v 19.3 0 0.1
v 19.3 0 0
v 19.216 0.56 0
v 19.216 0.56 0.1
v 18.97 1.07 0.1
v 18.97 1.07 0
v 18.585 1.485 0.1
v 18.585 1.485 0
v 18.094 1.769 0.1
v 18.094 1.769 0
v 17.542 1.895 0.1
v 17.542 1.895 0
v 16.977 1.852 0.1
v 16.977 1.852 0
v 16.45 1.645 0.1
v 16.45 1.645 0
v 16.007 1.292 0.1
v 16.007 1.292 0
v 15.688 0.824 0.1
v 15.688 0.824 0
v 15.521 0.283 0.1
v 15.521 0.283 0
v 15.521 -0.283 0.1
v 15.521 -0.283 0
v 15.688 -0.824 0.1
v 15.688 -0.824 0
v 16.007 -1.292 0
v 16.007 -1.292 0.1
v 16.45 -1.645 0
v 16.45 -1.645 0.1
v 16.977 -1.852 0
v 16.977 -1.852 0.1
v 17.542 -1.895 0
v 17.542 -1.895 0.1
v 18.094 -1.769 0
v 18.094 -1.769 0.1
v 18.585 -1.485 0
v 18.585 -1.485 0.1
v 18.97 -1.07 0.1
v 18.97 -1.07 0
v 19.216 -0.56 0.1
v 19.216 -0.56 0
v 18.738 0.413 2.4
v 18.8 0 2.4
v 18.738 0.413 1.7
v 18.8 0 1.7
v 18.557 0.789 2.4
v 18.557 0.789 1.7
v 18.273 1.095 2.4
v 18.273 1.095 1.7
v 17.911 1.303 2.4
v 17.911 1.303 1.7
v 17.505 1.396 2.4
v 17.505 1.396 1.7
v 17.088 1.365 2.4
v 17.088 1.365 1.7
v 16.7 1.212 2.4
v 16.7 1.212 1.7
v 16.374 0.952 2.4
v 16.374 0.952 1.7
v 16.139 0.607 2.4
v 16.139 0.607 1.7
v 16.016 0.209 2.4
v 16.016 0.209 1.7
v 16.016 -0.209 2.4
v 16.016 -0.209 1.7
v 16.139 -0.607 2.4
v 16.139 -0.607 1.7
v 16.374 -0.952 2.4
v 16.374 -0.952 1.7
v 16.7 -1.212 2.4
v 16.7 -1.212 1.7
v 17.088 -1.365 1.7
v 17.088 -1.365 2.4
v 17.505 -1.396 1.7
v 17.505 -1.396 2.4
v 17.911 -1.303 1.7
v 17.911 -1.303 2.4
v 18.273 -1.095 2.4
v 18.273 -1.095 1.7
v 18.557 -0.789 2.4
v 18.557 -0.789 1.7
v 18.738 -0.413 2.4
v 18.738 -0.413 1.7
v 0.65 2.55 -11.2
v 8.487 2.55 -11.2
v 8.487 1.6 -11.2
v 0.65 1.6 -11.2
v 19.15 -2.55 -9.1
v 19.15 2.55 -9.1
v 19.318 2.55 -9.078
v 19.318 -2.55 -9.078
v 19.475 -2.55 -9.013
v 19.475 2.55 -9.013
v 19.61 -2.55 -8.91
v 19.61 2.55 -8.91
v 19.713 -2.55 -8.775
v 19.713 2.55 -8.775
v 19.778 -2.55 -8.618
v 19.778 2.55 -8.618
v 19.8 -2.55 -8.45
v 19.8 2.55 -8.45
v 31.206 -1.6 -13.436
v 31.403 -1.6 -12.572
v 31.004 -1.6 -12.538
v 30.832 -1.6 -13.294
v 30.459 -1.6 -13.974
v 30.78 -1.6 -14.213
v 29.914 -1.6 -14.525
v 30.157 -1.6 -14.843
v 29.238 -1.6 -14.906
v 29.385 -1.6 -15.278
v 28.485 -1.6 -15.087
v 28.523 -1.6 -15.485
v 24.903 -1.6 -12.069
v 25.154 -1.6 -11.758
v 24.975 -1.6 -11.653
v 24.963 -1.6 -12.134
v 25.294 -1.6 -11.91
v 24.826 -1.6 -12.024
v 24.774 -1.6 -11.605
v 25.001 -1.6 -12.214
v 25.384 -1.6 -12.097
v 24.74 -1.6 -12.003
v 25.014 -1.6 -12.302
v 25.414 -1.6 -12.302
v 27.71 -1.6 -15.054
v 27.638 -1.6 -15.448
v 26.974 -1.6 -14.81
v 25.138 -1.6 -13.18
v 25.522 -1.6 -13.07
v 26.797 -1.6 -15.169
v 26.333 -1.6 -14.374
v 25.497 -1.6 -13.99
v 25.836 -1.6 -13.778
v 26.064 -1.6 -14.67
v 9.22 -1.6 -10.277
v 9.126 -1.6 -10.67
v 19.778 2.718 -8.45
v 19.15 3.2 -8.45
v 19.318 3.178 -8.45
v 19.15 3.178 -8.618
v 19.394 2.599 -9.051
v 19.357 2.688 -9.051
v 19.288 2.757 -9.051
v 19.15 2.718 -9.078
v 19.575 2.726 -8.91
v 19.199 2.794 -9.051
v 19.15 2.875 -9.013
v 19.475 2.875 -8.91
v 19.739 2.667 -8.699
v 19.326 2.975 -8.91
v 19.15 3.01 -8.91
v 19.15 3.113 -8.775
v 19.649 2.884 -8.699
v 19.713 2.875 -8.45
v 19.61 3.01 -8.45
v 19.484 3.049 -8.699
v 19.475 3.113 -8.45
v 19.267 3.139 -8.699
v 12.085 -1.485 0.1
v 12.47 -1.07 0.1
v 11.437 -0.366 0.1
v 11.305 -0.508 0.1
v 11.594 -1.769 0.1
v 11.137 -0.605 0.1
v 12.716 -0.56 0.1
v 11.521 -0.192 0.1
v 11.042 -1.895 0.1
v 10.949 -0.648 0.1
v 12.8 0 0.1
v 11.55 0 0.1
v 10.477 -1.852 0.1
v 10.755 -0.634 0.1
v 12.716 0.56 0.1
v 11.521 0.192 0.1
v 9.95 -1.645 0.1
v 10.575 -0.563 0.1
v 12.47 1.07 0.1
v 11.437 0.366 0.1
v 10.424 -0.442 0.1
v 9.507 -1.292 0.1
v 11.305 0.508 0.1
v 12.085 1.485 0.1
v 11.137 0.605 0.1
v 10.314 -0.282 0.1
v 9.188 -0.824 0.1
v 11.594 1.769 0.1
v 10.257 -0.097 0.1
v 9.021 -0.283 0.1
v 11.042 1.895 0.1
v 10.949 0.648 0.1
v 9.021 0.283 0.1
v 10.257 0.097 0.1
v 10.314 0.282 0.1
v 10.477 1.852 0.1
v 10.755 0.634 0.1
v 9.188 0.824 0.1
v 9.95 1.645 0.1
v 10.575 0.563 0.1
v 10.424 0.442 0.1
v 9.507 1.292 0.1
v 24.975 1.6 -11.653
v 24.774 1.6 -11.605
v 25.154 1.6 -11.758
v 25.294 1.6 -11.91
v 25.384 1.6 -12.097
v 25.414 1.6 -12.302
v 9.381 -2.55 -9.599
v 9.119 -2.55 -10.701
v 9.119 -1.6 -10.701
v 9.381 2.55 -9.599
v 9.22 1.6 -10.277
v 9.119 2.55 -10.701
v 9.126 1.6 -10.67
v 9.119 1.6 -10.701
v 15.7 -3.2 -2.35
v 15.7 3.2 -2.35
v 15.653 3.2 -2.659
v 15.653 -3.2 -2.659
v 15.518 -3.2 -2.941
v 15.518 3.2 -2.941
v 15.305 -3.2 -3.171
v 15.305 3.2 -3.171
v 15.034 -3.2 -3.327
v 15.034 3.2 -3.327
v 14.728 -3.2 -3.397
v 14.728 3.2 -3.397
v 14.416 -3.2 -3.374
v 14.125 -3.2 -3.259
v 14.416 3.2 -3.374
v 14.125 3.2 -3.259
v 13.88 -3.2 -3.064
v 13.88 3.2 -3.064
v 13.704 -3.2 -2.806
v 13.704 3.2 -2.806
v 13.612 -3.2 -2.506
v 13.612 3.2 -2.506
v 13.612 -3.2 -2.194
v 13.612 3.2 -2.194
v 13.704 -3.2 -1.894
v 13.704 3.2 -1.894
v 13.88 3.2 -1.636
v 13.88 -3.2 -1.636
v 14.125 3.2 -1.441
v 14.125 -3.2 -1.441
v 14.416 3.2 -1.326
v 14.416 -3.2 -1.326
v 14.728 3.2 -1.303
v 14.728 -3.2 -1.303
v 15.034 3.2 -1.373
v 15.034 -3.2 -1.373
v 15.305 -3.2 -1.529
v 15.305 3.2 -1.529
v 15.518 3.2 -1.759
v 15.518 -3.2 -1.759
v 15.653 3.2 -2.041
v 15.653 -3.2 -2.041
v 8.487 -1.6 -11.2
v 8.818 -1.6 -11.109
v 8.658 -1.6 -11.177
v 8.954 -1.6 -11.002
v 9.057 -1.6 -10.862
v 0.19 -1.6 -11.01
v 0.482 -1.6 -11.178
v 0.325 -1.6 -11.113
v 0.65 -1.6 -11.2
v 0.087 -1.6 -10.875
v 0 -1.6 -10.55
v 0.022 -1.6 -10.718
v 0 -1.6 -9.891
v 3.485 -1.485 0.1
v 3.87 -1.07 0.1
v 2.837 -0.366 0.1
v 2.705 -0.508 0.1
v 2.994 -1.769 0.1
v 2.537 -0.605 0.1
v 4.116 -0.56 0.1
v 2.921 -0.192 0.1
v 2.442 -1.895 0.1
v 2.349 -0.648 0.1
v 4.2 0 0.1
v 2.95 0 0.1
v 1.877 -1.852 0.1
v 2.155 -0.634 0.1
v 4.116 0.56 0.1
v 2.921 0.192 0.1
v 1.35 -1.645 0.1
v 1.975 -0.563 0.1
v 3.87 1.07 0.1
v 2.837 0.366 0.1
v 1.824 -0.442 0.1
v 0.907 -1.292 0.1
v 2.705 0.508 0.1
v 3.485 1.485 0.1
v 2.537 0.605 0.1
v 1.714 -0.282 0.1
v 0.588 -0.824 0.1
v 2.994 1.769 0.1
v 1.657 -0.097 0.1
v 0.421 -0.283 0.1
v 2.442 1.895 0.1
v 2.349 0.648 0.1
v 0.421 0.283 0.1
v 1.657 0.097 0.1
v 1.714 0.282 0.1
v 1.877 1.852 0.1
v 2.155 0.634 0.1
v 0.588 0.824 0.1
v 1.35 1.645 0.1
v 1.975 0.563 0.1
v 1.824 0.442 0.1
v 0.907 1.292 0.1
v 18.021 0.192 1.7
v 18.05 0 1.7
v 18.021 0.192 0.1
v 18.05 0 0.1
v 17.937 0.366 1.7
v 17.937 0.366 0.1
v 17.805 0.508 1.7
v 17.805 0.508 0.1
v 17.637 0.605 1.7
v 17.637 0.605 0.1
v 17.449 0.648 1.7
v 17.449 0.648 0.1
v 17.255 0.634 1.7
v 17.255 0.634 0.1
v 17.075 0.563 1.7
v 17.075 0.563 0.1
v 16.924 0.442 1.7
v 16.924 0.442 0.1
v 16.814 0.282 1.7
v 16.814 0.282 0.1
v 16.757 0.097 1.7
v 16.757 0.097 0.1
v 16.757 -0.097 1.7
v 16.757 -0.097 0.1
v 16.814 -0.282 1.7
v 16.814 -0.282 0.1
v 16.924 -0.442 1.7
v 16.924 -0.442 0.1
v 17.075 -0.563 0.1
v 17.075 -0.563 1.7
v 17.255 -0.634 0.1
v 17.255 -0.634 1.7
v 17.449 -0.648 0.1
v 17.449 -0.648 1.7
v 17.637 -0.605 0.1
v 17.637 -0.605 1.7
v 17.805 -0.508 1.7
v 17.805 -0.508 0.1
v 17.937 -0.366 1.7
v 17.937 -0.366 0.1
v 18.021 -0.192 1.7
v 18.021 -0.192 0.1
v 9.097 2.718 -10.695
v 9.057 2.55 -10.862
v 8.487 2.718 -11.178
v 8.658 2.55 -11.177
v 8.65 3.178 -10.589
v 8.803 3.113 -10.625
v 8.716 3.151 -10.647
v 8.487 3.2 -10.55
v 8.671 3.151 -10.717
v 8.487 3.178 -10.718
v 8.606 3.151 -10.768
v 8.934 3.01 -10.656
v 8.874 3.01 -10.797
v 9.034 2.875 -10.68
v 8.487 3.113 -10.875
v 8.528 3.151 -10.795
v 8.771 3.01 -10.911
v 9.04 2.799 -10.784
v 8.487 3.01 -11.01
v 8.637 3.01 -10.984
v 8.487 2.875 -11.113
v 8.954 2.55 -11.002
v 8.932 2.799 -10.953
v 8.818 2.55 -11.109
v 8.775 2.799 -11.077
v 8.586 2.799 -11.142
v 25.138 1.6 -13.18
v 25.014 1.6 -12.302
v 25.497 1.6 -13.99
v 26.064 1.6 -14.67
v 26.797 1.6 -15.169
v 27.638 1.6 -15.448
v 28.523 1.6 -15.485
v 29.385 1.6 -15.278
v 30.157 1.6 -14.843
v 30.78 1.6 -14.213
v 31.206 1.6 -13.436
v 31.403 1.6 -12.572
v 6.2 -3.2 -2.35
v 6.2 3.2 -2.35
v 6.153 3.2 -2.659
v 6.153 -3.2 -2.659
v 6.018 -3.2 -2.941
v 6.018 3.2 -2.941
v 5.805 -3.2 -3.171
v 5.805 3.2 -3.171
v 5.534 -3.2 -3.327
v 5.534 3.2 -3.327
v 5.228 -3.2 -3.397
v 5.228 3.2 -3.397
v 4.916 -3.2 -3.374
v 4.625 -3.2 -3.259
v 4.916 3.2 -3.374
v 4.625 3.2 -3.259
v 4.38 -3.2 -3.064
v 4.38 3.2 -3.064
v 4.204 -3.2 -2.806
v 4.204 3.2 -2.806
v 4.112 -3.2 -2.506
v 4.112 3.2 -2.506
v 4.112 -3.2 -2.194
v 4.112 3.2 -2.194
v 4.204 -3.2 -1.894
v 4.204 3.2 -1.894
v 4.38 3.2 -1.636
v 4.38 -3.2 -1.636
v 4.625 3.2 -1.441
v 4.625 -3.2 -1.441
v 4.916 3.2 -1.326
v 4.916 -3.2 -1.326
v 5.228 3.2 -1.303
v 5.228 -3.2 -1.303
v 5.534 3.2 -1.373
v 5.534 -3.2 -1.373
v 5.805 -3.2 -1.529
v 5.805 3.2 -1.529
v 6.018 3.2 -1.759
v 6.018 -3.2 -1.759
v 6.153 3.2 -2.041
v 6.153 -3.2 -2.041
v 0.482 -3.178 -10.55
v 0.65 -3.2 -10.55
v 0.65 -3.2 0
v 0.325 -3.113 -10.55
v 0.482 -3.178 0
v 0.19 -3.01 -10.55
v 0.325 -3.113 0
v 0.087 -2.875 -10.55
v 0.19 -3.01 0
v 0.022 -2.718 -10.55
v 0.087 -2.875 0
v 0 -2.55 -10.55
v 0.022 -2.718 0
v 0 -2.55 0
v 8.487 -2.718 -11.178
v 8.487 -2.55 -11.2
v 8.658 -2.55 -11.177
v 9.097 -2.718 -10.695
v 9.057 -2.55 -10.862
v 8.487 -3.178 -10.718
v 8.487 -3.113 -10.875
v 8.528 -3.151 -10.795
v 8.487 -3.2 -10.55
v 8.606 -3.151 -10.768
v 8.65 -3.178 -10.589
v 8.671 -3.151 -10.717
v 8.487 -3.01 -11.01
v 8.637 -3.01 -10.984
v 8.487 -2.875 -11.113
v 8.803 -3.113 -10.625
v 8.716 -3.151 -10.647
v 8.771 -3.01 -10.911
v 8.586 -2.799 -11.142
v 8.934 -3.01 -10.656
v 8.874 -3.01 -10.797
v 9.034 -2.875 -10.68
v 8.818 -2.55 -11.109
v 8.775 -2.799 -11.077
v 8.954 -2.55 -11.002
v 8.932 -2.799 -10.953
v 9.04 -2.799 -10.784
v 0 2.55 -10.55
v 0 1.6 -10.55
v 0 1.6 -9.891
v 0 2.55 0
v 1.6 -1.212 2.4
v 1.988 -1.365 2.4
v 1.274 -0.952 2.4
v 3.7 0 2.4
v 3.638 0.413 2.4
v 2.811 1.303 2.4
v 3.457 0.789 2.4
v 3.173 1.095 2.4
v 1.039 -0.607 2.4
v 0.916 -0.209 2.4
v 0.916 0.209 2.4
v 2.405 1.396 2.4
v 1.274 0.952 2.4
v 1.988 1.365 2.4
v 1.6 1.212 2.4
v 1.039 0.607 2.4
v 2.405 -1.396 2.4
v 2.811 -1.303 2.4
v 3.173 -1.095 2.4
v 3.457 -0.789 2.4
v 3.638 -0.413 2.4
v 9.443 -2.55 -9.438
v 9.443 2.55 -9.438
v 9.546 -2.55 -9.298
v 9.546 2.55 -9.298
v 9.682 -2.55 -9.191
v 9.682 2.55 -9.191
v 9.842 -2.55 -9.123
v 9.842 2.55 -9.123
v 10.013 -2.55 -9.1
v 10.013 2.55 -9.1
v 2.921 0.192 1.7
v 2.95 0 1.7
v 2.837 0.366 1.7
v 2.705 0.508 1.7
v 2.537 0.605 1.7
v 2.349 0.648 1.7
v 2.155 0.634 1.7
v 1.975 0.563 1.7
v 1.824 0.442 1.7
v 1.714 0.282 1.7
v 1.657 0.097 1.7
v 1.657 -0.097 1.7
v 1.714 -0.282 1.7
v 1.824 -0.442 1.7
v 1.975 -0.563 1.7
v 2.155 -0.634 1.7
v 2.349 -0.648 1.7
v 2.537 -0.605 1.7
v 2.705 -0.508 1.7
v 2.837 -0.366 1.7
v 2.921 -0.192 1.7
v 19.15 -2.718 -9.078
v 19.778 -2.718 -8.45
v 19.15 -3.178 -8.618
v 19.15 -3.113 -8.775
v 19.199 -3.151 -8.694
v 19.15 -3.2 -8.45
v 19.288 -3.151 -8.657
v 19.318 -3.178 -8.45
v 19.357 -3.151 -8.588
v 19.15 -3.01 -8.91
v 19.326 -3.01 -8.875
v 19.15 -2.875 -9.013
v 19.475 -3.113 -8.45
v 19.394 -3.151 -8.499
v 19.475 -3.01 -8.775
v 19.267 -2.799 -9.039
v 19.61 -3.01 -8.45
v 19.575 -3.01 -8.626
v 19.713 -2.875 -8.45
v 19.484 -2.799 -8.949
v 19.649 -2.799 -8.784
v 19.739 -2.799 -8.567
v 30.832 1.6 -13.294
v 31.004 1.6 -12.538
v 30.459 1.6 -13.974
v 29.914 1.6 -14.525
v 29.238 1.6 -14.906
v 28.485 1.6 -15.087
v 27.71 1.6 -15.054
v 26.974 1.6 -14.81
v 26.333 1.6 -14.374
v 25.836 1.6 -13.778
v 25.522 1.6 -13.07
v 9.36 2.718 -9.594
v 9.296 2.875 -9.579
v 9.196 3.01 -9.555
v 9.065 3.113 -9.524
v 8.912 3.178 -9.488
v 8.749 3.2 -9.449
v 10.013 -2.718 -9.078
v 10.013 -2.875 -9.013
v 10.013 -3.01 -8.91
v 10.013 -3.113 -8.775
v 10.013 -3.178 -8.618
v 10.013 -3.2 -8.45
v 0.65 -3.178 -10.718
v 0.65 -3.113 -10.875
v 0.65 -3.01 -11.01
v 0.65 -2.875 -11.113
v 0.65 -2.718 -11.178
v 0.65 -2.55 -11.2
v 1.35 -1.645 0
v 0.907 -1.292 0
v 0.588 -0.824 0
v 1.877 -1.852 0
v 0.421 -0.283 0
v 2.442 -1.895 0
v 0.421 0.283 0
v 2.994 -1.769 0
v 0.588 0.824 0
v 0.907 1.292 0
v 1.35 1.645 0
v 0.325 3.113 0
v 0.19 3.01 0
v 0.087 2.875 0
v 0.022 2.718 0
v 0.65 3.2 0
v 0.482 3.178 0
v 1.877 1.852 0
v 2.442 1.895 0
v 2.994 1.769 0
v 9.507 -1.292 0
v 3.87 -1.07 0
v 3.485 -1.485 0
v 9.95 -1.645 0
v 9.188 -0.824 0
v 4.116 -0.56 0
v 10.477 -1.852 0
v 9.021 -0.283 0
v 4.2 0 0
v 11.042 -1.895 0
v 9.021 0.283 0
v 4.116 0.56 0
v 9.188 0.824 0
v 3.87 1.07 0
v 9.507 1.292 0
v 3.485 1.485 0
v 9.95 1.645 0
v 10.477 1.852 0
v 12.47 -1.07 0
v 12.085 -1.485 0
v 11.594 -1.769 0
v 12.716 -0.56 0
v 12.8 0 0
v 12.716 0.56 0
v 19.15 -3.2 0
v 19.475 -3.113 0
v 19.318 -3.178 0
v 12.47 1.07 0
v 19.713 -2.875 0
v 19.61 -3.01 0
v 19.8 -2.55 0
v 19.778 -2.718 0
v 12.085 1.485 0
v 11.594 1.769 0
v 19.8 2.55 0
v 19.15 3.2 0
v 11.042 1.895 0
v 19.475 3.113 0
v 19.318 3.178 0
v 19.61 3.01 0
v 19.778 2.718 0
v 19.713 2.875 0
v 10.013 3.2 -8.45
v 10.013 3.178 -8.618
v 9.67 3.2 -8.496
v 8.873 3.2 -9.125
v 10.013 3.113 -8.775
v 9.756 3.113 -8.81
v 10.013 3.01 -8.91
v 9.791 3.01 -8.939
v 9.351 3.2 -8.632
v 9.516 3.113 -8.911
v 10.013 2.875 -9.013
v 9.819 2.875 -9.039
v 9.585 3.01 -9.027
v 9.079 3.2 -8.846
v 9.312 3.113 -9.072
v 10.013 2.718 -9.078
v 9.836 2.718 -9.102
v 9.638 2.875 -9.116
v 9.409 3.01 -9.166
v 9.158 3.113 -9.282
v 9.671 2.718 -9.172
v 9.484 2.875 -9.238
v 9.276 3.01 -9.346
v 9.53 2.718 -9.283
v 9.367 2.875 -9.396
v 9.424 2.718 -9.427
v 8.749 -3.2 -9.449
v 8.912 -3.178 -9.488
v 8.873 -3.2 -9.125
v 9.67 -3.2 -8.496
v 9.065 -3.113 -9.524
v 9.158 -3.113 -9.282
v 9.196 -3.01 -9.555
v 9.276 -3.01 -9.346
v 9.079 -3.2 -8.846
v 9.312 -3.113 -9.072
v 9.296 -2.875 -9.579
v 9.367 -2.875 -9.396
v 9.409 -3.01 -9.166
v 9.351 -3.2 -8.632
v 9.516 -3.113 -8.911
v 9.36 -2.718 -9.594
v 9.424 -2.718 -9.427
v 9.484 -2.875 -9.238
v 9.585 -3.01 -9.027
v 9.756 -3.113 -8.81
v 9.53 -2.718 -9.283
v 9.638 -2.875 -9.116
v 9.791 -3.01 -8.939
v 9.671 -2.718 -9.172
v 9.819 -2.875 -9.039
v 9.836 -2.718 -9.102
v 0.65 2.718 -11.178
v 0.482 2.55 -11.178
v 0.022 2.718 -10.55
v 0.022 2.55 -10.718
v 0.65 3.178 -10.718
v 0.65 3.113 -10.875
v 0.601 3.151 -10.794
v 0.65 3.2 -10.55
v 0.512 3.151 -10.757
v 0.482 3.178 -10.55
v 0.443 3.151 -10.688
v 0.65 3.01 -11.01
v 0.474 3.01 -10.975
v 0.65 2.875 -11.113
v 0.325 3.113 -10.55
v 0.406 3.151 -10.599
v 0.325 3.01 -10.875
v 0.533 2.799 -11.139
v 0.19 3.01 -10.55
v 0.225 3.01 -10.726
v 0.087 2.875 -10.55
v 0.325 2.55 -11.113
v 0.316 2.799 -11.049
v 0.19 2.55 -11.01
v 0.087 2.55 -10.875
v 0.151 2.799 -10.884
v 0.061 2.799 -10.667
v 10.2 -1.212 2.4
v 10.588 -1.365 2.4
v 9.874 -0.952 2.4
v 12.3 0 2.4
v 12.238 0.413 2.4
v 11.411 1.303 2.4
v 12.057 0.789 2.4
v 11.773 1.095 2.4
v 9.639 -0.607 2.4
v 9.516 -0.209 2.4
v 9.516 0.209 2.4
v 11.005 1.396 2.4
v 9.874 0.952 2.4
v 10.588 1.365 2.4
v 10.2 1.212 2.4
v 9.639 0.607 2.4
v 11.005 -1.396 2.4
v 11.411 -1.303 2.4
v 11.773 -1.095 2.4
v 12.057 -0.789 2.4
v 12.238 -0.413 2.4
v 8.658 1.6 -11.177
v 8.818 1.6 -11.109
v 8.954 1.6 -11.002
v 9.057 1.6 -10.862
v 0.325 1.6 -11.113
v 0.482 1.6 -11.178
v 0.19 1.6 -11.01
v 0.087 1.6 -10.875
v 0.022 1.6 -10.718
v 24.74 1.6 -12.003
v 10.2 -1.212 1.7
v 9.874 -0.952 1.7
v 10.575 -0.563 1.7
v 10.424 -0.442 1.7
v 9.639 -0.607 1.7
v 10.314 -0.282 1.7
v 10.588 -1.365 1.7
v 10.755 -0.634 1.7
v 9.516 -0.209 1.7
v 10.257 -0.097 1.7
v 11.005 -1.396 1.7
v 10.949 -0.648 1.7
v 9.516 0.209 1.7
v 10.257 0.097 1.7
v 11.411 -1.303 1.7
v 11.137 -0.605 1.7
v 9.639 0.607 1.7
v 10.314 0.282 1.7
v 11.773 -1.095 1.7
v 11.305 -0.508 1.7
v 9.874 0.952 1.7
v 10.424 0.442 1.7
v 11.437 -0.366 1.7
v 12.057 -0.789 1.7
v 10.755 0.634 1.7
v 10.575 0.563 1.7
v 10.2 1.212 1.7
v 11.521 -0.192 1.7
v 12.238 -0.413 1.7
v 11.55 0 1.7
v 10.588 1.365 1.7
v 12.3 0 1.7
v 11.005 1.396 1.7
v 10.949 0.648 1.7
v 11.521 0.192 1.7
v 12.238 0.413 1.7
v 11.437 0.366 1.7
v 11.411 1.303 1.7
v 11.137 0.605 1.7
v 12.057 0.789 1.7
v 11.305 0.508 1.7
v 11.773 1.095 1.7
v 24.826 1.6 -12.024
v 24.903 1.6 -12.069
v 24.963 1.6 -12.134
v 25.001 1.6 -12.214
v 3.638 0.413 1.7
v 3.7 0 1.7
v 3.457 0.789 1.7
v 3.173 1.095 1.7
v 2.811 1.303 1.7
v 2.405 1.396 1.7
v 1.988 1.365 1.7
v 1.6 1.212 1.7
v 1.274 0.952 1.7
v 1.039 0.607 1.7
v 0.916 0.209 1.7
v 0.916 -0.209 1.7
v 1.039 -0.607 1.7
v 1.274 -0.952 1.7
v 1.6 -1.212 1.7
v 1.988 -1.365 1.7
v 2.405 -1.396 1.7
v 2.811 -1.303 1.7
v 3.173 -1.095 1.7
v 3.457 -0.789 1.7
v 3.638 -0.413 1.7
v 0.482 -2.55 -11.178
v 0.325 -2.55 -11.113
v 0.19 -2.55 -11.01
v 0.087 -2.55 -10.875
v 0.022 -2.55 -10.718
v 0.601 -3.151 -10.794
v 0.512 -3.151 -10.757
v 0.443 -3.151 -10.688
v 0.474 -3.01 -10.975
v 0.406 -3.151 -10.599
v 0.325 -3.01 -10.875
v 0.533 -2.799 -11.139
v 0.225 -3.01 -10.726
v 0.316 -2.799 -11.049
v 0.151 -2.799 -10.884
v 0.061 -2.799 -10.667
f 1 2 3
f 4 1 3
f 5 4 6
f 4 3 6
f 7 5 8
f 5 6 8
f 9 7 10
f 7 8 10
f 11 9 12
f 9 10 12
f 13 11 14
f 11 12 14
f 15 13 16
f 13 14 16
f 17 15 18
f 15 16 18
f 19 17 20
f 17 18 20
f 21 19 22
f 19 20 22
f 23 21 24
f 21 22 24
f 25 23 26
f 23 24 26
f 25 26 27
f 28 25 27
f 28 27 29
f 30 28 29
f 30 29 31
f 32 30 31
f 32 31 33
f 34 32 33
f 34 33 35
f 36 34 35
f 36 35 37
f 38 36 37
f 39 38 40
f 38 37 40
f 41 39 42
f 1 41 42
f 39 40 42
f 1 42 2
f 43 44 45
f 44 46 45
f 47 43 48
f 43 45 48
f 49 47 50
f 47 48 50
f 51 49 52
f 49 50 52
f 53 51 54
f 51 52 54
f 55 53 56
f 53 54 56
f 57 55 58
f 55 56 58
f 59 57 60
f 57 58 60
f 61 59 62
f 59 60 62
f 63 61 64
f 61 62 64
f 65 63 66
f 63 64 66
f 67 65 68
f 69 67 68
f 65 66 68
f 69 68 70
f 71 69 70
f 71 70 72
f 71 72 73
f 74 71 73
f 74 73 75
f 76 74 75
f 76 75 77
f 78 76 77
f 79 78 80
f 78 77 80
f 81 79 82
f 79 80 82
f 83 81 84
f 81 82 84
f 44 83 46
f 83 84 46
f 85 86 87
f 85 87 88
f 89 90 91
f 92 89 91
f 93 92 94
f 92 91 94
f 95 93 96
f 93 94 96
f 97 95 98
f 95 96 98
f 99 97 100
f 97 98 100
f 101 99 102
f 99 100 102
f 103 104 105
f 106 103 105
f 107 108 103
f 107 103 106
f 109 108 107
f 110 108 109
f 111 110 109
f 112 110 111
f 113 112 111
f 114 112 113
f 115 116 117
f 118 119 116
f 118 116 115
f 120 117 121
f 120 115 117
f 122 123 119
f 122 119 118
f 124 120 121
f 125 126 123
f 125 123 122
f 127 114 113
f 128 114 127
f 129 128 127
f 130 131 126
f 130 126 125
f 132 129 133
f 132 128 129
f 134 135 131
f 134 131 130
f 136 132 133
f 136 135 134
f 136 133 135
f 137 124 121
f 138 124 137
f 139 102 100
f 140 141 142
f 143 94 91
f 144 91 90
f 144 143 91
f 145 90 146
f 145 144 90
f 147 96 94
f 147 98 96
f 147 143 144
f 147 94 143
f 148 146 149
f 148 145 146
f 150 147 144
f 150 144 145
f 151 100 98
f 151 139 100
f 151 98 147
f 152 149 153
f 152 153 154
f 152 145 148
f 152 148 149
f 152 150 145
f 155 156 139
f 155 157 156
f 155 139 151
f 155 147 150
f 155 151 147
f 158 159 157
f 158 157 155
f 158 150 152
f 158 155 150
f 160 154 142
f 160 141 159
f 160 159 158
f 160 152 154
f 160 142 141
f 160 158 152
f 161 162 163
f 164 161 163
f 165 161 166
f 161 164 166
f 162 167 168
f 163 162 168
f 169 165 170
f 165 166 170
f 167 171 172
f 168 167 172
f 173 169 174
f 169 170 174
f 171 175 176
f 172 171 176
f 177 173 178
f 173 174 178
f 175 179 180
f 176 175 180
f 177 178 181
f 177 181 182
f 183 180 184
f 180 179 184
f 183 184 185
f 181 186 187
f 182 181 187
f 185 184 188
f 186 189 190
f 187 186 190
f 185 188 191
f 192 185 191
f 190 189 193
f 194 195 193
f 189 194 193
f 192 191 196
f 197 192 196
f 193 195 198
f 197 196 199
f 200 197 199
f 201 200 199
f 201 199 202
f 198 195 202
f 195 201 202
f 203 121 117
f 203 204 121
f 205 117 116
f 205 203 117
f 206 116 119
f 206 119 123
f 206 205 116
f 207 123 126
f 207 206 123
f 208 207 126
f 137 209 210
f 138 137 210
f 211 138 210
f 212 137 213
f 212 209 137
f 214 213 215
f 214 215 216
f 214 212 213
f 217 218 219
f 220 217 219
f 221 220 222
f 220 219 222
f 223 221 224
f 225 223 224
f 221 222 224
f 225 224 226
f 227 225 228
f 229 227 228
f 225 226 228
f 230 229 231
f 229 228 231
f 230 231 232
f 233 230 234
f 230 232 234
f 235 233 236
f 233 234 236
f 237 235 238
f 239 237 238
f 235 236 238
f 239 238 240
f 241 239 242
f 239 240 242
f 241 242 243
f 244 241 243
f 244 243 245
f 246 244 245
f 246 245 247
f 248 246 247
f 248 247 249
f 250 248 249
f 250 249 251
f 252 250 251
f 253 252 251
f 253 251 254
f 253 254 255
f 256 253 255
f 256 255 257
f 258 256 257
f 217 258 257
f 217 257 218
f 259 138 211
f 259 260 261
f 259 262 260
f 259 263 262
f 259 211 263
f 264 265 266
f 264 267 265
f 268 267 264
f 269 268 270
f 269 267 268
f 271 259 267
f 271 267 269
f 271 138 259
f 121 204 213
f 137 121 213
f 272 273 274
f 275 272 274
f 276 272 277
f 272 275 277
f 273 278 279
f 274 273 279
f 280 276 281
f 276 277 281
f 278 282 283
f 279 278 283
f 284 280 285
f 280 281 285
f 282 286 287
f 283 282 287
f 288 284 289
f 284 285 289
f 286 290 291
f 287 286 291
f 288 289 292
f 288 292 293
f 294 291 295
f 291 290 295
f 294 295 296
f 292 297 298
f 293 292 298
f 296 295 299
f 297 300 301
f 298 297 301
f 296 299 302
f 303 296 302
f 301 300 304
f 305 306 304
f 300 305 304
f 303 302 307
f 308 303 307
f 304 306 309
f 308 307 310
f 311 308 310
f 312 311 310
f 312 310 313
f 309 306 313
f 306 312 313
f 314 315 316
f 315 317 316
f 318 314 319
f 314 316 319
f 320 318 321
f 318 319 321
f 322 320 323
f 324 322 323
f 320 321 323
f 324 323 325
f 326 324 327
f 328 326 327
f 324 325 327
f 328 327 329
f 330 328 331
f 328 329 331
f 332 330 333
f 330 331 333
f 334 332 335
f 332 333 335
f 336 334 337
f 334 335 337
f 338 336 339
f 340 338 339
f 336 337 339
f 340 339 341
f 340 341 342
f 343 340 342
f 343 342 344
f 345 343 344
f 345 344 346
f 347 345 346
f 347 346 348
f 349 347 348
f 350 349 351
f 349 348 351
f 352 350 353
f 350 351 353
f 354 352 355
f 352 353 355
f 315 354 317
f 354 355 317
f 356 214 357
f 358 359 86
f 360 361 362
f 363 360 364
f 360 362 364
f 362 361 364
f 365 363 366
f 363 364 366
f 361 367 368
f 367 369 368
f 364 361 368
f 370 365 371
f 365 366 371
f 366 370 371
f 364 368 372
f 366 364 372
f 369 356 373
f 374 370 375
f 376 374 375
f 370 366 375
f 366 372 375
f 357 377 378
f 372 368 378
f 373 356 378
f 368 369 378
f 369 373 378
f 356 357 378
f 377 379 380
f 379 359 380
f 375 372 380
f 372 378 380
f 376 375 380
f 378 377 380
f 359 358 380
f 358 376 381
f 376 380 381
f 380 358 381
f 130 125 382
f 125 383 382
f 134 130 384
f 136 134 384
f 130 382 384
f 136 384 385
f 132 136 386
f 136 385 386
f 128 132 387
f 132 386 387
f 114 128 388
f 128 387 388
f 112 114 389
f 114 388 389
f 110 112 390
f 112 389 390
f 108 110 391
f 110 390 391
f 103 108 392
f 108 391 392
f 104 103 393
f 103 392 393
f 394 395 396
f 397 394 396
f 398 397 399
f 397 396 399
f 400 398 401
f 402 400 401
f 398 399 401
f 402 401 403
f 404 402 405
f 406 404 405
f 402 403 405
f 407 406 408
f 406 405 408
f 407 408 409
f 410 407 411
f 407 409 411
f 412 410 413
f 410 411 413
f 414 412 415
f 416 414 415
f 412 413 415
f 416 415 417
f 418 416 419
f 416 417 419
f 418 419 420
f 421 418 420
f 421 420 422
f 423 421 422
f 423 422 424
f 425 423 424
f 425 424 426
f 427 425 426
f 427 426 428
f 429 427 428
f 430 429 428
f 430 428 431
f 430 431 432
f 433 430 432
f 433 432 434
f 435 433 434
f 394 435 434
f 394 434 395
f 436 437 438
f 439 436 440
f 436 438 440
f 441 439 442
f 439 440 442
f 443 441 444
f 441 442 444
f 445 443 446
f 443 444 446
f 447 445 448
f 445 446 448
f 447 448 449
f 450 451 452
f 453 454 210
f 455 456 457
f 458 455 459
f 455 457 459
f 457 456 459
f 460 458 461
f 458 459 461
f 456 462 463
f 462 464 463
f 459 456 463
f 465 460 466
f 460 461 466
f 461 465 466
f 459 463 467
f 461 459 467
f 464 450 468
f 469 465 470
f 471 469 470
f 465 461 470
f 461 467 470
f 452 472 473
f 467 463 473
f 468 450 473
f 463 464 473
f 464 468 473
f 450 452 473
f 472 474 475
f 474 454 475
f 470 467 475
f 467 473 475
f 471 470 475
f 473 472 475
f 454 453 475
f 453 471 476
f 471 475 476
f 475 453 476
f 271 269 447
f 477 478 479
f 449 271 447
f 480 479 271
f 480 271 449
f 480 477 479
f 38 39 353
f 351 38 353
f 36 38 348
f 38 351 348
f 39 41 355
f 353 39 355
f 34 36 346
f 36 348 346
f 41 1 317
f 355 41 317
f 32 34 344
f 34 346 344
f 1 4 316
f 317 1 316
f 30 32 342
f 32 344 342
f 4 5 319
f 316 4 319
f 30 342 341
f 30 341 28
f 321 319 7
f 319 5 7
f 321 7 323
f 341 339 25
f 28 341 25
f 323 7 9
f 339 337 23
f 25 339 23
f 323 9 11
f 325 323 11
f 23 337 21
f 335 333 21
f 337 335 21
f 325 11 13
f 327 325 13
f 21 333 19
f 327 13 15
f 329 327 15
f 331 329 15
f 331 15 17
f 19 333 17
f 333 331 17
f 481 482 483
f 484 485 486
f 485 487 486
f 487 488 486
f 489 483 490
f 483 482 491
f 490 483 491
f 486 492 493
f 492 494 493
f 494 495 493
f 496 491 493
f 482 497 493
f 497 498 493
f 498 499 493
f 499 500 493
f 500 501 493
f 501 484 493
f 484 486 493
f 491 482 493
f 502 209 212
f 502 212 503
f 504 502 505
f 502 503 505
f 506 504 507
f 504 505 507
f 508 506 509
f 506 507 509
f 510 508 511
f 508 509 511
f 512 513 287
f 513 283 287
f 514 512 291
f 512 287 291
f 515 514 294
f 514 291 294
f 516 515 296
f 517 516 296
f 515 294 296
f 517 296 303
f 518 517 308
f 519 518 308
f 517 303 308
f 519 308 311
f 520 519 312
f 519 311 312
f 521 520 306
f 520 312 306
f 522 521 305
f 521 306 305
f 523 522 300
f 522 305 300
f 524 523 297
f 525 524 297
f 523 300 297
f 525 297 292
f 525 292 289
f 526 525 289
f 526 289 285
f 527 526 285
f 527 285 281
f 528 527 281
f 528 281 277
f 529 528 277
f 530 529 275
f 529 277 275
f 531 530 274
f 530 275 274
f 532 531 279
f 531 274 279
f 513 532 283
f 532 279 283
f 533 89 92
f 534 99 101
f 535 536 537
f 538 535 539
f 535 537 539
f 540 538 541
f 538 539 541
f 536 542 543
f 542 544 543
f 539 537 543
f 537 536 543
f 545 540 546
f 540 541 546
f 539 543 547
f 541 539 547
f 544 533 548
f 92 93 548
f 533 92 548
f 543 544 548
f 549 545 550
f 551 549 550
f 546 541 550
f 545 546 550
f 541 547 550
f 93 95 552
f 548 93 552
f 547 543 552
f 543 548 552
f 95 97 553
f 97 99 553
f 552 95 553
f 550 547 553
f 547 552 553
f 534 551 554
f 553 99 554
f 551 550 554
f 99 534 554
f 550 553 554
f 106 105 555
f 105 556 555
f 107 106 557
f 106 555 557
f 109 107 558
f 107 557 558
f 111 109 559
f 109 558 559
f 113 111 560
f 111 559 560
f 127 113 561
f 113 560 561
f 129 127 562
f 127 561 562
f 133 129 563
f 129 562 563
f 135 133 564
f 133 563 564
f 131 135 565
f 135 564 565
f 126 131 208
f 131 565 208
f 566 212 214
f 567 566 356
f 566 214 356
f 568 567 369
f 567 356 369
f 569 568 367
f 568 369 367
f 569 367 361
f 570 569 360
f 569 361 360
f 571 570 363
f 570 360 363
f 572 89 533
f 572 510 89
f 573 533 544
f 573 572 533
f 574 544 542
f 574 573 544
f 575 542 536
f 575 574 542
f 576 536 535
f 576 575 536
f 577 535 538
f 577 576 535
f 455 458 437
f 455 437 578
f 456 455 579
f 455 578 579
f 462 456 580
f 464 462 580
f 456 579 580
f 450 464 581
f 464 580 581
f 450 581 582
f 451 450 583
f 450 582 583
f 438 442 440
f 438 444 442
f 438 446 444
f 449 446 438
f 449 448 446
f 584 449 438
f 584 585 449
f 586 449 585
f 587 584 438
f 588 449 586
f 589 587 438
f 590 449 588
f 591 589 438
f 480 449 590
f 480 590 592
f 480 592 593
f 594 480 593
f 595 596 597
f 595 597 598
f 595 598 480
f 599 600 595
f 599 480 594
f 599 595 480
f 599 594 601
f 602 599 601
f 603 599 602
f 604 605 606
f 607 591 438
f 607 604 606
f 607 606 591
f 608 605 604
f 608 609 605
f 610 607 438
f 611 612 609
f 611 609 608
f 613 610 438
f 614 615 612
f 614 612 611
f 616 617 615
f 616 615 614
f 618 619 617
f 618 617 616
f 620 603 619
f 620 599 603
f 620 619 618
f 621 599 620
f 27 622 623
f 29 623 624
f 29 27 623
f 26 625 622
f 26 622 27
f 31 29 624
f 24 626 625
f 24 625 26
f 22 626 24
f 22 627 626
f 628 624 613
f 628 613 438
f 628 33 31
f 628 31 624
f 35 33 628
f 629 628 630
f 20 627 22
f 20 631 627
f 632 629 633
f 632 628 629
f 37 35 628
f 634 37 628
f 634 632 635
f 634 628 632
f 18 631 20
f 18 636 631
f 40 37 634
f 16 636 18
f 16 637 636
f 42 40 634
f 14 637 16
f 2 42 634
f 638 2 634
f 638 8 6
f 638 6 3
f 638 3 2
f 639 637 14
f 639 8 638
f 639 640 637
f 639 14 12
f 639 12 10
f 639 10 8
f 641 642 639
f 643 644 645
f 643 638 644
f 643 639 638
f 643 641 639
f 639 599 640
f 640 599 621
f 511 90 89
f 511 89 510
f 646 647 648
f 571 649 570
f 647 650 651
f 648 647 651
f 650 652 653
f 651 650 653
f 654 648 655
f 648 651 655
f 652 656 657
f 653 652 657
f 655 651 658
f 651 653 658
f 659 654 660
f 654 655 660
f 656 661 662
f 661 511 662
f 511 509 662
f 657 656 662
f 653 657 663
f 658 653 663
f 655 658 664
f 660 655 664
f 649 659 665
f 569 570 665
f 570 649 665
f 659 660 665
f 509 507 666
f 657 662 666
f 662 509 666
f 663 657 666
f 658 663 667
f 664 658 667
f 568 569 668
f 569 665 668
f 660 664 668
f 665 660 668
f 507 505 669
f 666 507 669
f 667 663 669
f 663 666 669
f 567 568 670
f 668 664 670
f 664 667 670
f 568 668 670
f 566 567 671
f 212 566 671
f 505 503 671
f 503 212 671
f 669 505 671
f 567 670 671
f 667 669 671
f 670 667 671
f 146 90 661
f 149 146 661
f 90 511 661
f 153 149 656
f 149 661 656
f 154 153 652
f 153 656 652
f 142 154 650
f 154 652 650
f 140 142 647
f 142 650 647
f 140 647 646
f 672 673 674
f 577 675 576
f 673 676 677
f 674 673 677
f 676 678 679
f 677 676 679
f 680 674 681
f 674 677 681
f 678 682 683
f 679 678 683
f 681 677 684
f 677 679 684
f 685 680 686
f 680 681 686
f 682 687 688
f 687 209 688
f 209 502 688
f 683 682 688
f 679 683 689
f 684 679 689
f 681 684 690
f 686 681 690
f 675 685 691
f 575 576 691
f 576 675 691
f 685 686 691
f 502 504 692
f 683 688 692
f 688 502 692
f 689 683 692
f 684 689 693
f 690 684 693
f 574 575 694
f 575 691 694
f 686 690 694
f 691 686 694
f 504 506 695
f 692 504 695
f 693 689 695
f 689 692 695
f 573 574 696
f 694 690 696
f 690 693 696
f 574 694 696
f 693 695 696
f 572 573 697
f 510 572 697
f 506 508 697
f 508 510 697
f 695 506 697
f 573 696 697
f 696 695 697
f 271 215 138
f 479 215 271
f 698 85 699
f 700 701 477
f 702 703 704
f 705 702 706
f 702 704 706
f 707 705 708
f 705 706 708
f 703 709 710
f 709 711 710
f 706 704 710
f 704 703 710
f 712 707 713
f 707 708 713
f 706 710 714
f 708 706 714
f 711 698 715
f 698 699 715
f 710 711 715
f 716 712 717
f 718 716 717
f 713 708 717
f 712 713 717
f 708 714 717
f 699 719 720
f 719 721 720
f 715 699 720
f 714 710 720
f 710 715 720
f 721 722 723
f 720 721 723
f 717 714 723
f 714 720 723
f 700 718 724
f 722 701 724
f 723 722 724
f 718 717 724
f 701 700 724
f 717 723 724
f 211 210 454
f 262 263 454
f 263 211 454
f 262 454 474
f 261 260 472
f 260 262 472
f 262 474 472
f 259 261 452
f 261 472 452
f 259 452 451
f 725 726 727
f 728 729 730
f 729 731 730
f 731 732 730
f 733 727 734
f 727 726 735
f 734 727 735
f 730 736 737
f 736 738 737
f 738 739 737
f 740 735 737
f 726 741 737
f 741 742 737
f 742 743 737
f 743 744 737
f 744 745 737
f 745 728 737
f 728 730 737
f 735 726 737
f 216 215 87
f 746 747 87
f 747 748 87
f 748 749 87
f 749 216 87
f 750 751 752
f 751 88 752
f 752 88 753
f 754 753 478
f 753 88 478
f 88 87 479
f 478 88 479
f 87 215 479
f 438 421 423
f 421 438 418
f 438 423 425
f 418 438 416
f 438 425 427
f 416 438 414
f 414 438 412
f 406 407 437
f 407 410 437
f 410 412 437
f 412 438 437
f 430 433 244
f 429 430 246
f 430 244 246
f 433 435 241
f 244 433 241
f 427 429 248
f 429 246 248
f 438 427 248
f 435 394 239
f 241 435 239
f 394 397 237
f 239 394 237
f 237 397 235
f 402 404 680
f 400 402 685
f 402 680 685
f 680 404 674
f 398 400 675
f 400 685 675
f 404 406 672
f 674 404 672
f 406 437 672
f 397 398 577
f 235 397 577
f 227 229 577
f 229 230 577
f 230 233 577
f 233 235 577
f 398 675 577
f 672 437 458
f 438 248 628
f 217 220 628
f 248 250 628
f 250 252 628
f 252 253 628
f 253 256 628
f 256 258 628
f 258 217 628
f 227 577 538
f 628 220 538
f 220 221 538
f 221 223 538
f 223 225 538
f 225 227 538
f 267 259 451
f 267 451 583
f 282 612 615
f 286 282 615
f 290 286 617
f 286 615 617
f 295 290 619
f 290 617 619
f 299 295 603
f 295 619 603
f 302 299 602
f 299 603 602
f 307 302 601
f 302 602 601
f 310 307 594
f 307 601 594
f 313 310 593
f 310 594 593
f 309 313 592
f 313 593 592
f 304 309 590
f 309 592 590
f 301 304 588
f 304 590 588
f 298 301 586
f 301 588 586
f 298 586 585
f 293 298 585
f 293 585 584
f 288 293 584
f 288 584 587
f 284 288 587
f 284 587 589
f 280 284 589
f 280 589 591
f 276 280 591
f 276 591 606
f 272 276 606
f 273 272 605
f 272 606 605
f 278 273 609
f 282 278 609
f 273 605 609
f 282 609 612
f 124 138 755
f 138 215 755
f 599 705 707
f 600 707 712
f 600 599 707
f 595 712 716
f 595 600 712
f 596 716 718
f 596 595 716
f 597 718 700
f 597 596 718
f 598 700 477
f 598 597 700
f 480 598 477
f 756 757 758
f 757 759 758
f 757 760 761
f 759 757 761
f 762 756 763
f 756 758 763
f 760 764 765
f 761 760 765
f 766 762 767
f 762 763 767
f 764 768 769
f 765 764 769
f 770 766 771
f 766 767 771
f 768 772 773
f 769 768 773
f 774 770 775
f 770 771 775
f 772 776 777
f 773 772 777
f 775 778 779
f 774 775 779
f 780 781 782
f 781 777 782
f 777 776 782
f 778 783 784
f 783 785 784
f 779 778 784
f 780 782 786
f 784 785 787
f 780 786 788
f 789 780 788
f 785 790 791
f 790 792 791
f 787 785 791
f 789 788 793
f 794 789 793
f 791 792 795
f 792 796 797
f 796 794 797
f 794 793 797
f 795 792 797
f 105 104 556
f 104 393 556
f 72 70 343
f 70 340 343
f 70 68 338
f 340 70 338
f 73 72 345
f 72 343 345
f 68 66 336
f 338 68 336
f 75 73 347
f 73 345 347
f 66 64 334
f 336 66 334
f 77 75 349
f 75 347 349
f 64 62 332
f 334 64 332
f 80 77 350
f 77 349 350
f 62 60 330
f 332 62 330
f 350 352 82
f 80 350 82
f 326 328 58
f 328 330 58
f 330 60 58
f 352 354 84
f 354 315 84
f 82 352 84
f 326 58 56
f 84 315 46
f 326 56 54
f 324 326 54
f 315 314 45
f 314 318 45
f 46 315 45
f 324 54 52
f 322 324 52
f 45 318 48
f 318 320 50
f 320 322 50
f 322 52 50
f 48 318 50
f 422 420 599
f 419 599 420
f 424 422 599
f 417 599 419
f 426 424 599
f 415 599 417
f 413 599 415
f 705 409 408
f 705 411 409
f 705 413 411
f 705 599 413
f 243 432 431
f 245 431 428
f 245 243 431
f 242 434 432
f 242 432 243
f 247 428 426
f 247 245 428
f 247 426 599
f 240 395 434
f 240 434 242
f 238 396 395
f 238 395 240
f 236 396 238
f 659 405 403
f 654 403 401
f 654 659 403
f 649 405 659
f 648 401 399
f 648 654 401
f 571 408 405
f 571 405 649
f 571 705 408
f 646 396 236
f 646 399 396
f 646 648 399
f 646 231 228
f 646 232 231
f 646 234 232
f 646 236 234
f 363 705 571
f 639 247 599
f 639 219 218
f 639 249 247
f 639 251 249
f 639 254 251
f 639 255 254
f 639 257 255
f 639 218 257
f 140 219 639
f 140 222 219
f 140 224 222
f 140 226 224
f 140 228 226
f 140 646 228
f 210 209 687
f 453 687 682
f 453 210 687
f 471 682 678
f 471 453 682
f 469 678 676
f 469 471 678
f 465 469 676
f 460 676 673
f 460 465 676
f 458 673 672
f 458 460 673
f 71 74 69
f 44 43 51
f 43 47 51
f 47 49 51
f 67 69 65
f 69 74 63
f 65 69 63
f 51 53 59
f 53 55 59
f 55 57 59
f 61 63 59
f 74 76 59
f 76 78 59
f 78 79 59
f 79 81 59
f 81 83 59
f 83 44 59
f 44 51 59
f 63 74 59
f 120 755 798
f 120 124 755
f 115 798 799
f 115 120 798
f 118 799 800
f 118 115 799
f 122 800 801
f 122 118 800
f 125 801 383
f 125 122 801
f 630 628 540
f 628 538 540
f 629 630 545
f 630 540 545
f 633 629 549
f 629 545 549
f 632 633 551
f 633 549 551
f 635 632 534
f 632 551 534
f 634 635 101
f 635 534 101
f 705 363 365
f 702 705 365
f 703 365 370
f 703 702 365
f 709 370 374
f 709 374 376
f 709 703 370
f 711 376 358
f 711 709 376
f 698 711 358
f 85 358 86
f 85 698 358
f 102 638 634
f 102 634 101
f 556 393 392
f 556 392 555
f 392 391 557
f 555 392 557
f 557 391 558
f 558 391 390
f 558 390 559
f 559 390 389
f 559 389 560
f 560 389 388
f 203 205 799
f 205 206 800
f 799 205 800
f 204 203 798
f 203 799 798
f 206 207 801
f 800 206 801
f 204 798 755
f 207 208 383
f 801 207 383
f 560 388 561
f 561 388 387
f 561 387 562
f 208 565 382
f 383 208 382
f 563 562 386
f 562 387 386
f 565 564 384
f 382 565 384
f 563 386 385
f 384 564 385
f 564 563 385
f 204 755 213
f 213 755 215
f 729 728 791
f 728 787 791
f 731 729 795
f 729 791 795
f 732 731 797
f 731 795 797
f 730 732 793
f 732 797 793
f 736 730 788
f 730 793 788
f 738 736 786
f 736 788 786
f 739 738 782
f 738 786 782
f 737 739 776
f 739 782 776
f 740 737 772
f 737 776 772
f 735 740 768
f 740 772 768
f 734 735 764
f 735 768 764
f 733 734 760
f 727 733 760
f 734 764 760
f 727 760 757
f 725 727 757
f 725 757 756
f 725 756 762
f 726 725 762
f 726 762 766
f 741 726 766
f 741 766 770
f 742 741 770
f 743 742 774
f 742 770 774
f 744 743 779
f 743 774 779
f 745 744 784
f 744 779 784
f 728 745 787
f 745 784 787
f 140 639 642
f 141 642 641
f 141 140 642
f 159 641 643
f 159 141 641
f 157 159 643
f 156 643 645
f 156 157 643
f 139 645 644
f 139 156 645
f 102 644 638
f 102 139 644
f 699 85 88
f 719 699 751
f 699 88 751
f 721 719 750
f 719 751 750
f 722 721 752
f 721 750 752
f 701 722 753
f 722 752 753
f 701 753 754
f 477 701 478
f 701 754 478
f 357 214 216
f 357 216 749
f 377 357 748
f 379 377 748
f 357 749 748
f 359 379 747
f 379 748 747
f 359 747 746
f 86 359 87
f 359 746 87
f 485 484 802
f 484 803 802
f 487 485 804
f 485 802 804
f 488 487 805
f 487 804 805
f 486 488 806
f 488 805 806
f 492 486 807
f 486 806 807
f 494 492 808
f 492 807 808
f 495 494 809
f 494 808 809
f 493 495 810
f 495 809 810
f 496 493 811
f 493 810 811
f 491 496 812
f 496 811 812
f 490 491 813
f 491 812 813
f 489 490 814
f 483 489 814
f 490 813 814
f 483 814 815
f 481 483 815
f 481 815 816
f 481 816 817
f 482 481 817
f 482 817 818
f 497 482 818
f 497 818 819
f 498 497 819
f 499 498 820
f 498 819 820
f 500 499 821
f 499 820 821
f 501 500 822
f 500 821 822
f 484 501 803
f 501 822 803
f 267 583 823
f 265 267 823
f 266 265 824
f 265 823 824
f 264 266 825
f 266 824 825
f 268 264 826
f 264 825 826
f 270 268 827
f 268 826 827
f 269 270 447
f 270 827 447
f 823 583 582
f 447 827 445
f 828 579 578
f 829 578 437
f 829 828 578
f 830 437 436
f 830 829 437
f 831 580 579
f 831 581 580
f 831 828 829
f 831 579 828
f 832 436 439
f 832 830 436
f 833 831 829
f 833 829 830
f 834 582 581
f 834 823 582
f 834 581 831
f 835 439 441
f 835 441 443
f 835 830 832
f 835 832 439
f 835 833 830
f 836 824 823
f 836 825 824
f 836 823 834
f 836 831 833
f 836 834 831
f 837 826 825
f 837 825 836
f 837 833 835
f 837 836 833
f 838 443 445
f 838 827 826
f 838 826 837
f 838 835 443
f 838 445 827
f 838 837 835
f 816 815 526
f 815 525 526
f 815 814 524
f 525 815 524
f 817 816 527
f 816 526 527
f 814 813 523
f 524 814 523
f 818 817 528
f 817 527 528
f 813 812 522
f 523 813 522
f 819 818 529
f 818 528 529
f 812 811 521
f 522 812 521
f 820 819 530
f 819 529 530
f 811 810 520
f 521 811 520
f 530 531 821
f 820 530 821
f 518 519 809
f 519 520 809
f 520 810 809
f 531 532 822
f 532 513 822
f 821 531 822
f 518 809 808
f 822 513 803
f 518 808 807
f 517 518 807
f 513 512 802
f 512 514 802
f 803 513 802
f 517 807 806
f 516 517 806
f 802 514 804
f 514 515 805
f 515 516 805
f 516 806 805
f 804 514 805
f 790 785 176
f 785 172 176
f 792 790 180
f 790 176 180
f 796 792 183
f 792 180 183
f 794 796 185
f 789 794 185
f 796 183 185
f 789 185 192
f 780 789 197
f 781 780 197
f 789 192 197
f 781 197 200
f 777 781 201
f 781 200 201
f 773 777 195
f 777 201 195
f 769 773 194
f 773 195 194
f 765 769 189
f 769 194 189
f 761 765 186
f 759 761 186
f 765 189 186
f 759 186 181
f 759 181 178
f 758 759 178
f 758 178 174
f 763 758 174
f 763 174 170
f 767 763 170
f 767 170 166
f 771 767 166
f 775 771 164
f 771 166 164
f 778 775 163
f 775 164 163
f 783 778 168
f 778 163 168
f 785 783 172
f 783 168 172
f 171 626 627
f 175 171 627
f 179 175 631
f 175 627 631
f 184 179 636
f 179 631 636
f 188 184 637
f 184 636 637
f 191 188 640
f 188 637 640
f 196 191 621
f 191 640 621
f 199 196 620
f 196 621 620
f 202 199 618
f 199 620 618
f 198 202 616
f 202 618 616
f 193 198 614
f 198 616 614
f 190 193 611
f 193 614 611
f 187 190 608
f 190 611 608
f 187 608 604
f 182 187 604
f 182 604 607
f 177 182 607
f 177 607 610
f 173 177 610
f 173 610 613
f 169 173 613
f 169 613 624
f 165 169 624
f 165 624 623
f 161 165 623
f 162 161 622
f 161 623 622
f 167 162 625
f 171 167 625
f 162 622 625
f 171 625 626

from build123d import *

# Parameters (mm, degrees)
BOSS_EXTRUDE1_DEPTH = 3.2
SKETCH3_R           = 1.05
CUT_EXTRUDE1_DEPTH  = 16.4
EXTRUDE_THIN1_DEPTH = 1.6
FILLET1_R           = 0.65
SKETCH5_W           = 13.579197801
SKETCH5_H           = 3.2
CUT_EXTRUDE2_DEPTH  = 16.4
FILLET2_R           = 0.3
FILLET3_R           = 0.7
LPATTERN1_COUNT     = 2
LPATTERN1_PITCH     = 15.1
LPATTERN2_COUNT     = 2
LPATTERN2_PITCH     = 8.6


with BuildPart() as part:
    # Sketch2 → Boss-Extrude1 (new, symmetric)
    with BuildSketch(Plane(origin=(0, 0, 0), x_dir=(1, 0, 0), z_dir=(0, 1, 0))):
        Polygon((0, 0), (19.8, 0), (19.8, 9.1), (9.5, 9.1), (9, 11.2), (0, 11.2), align=None)
    extrude(amount=BOSS_EXTRUDE1_DEPTH, both=True)

    # Sketch3 → Cut-Extrude1 (cut)
    with BuildSketch(Plane(origin=(0, 3.2, 0), x_dir=(1, 0, 0), z_dir=(0, 1, 0))):
        with Locations((5.15, 2.35)):
            Circle(SKETCH3_R)
        with Locations((14.65, 2.35)):
            Circle(SKETCH3_R)
    extrude(amount=-CUT_EXTRUDE1_DEPTH, mode=Mode.SUBTRACT)

    # Sketch4 → Extrude-Thin1 (add, symmetric)
    with BuildSketch(Plane(origin=(0, 0, 0), x_dir=(1, 0, 0), z_dir=(0, 1, 0))):
        with BuildLine():
            Line((1.292236799, 10.001697091), (25.025910468, 12.027810166))
            ThreePointArc((25.025910468, 12.027810166), (27.942123478, 15.488402844), (31.402716155, 12.572189834))
            Line((31.402716155, 12.572189834), (31.0041658, 12.538166105))
            ThreePointArc((31.0041658, 12.538166105), (27.776970564, 15.065633982), (25.487099181, 11.665726334))
            Line((25.487099181, 11.665726334), (1.326260528, 9.603146736))
            Line((1.326260528, 9.603146736), (1.292236799, 10.001697091))
        make_face()
    extrude(amount=EXTRUDE_THIN1_DEPTH, both=True)

    # Fillet1
    fillet1_edges = [part.edges().sort_by_distance(p)[0] for p in [
        (0, 0, -11.2),
        (0, 3.2, -5.6),
        (0, -3.2, -5.6),
        (9.25, -3.2, -10.15),
        (9, 0, -11.2),
        (14.65, -3.2, -9.1),
        (19.8, -3.2, -4.55),
        (9.5, 0, -9.1),
        (19.8, 0, -9.1),
        (19.8, 3.2, -4.55),
        (14.65, 3.2, -9.1),
        (9.25, 3.2, -10.15),
        (4.5, -3.2, -11.2),
        (4.5, 3.2, -11.2),
    ]]
    fillet(fillet1_edges, radius=FILLET1_R)

    # Sketch5 → Cut-Extrude2 (cut)
    with BuildSketch(Plane(origin=(-0.838304969, 0, -9.819815492), x_dir=(-0.9963758886901375, 0, 0.08505932304538345), z_dir=(-0.08505932304538345, 0, -0.9963758886901375))):
        with Locations((-4.790866227, 0)):
            Rectangle(SKETCH5_W, SKETCH5_H)
    extrude(amount=CUT_EXTRUDE2_DEPTH, mode=Mode.SUBTRACT)

    # Fillet2
    fillet2_edges = [part.edges().sort_by_distance(p)[0] for p in [
        (25.025910468, 0, -12.027810166),
    ]]
    fillet(fillet2_edges, radius=FILLET2_R)

    # Fillet3
    fillet3_edges = [part.edges().sort_by_distance(p)[0] for p in [
        (25.487099181, 0, -11.665726334),
    ]]
    fillet(fillet3_edges, radius=FILLET3_R)

    # Sketch6 → Revolve1 (revolve)
    with BuildSketch(Plane(origin=(0, 0, 0), x_dir=(1, 0, 0), z_dir=(0, 1, 0))):
        Polygon((2.3, 0.658981297), (2.3, -2.4), (3.7, -2.4), (3.7, -1.7), (2.95, -1.7), (2.95, -0.1), (4.2, -0.1), (4.2, 0.658981297), align=None)
    revolve1 = revolve(axis=Axis((2.3, 0, -0.658981297), (0, 0, 1)))

    # LPattern1: Revolve1 ×2
    with Locations(*[(i * LPATTERN1_PITCH, 0, 0) for i in range(1, LPATTERN1_COUNT)]):
        add(revolve1)

    # LPattern2: Revolve1 ×2
    with Locations(*[(i * LPATTERN2_PITCH, 0, 0) for i in range(1, LPATTERN2_COUNT)]):
        add(revolve1)


solid = part.part
